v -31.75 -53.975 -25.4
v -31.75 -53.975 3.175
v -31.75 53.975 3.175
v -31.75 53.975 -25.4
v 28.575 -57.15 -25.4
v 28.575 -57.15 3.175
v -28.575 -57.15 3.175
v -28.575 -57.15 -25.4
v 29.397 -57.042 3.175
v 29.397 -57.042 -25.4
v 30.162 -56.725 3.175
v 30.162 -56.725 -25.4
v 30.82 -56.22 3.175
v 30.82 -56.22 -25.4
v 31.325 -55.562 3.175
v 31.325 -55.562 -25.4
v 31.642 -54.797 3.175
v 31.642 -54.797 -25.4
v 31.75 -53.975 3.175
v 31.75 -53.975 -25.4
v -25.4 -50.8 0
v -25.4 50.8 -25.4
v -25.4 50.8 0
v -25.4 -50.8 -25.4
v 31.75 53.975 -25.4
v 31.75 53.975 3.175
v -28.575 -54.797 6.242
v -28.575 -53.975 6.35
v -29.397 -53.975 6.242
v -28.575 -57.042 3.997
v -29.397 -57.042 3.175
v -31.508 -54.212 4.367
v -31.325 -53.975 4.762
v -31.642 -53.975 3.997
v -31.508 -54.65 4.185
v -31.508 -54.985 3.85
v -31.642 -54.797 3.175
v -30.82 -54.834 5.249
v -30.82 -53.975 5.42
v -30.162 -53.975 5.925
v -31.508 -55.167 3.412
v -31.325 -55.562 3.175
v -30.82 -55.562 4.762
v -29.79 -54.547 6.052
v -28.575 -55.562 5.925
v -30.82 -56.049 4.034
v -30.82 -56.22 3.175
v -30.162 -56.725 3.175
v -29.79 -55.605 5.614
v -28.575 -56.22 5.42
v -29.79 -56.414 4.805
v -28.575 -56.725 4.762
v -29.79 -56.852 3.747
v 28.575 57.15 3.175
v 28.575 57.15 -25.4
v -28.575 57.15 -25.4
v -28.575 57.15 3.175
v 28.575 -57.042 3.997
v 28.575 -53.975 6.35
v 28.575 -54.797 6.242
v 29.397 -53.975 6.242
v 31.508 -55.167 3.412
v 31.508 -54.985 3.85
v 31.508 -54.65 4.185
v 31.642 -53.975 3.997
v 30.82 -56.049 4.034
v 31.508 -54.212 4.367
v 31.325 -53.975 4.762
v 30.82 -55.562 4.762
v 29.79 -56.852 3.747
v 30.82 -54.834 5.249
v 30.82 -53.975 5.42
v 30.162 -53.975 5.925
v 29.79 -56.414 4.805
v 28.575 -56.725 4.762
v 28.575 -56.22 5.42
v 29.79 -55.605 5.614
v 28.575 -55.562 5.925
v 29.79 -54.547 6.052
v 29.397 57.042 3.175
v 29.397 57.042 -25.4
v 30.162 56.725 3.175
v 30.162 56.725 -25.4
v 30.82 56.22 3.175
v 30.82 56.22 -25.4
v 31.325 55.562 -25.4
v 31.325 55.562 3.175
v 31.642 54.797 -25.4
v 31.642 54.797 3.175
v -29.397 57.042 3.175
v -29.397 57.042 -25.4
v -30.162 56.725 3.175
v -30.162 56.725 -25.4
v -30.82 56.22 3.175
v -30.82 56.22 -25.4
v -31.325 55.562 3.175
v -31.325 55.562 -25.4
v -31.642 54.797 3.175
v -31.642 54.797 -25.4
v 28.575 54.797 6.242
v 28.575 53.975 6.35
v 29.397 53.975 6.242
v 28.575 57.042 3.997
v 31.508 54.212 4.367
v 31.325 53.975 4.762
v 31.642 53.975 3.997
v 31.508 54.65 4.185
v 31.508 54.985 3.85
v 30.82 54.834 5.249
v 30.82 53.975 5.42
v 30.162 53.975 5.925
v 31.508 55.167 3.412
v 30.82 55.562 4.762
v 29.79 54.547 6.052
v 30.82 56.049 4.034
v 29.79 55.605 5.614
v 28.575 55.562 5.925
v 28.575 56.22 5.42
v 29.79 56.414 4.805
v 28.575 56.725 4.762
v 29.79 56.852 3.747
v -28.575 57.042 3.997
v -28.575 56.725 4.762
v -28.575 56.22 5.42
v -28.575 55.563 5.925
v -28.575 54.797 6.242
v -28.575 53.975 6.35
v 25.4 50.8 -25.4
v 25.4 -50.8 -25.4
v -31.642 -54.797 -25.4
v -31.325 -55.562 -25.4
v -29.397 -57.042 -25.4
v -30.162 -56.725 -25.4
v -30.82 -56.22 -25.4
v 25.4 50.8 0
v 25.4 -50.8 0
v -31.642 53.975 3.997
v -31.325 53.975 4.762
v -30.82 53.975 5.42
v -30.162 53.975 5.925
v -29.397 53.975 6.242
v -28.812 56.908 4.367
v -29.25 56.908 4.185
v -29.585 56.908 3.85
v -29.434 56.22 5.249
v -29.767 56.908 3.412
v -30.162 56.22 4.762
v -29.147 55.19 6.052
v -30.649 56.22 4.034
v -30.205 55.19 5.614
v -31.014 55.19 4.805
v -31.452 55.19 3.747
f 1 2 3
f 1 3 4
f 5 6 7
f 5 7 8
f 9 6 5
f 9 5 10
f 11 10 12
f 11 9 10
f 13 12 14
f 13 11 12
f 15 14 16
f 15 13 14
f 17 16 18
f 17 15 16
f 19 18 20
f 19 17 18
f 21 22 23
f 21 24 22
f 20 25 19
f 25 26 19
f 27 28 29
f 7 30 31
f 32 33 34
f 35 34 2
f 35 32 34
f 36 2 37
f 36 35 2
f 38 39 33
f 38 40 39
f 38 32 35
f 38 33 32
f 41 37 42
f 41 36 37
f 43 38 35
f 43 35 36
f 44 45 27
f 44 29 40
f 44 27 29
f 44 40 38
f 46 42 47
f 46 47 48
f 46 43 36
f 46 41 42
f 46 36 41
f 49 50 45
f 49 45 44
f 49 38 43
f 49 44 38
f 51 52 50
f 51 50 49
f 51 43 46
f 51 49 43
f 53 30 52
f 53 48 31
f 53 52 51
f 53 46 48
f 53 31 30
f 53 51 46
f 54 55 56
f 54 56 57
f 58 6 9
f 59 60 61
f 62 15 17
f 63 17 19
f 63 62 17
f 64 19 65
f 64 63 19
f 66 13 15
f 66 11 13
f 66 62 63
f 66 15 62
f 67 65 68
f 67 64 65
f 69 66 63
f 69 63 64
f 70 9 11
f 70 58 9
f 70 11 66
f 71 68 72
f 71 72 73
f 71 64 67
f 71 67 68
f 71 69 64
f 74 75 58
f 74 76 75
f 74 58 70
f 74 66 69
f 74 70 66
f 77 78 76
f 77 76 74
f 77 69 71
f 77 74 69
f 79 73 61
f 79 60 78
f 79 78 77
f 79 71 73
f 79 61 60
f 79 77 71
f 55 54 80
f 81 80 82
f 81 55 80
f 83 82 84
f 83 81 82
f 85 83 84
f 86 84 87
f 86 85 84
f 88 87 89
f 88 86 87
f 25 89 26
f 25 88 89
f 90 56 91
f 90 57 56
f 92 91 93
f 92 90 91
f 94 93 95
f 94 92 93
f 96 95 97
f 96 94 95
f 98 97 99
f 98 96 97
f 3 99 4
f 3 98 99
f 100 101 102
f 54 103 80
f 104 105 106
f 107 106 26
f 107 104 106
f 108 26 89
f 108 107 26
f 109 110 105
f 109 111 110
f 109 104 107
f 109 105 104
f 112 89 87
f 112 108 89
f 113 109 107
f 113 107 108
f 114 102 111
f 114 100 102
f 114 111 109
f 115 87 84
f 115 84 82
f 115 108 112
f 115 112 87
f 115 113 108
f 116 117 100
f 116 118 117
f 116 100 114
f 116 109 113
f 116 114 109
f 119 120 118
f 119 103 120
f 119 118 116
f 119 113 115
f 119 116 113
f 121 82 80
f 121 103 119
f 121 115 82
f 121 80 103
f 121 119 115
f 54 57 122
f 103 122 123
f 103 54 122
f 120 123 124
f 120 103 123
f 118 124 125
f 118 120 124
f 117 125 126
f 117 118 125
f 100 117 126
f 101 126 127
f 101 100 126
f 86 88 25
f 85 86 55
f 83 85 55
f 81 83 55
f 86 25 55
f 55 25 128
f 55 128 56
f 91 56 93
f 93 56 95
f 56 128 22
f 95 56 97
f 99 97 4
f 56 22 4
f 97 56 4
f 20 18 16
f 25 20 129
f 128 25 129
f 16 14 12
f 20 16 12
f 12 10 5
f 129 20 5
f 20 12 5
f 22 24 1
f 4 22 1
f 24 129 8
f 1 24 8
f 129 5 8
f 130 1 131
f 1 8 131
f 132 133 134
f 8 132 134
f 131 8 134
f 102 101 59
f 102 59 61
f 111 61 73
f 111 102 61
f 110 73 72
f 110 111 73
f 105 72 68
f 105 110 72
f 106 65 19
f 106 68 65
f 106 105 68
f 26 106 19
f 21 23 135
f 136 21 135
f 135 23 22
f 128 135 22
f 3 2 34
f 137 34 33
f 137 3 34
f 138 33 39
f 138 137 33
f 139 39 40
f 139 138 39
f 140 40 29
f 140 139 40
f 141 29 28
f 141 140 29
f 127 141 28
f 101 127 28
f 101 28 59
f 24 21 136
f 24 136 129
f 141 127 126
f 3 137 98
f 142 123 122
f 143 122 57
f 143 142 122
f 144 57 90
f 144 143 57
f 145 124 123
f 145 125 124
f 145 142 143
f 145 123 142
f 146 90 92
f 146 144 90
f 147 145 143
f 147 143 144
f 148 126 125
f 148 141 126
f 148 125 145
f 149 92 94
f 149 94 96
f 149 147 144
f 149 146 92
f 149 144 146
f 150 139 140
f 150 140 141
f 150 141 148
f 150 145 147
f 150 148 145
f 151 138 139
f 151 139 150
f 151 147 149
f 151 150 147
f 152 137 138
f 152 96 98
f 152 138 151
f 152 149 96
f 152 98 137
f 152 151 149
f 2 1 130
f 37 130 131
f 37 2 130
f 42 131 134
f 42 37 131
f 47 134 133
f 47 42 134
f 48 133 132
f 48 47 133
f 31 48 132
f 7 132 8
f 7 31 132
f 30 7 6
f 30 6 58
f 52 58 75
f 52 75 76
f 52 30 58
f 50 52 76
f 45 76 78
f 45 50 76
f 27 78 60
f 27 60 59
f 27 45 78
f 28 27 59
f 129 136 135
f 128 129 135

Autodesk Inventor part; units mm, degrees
ref_plane "YZ Plane" through (0, 0, 0) normal (1, 0, 0) x (0, 1, 0)
ref_plane "XZ Plane" through (0, 0, 0) normal (0, 1, 0) x (-1, 0, 0)
ref_plane "XY Plane" through (0, 0, 0) normal (0, 0, 1) x (1, 0, 0)
sketch "Sketch1" plane through (0, 0, 0) normal (0, 0, 1) x (1, 0, 0)
  line L0 (-25.4, -50.8) -> (25.4, -50.8)
  line L1 (25.4, -50.8) -> (25.4, 50.8)
  line L2 (25.4, 50.8) -> (-25.4, 50.8)
  line L3 (-25.4, 50.8) -> (-25.4, -50.8)
  line L4 (-25.4, -50.8) -> (25.4, 50.8) construction
  line L5 (25.4, -50.8) -> (-25.4, 50.8) construction
  point P0 (0, 0)
  dimension "d0" = 50.8
  dimension "d1" = 101.6
extrude "Extrusion1" add sketch "Sketch1" along normal blind 6.35
sketch "Sketch2" plane through (25.4, -50.8, 0) normal (1, 0, 0) x (0, 0, -1)
  line L0 (-6.35, 0) -> (-6.35, 101.6) projected
  line L1 (-6.35, 101.6) -> (0, 101.6)
  line L2 (0, 101.6) -> (0, 0)
  line L3 (0, 0) -> (-6.35, 0)
  line L4 (-6.35, 0) -> (-6.35, 101.6)
  point P0 (0, 50.8)
extrude "Extrusion2" add sketch "Sketch2" along normal blind 6.35
sketch "Sketch3" plane through (-25.4, -50.8, 0) normal (-1, 0, 0) x (0, 0, 1)
  point P0 (0, 50.8)
sketch "Sketch4" plane through (-25.4, -50.8, 0) normal (-1, 0, 0) x (0, 0, 1)
  line L0 (6.35, 101.6) -> (6.35, 0) projected
  line L1 (0, 0) -> (6.35, 0) projected
  line L2 (6.35, 101.6) -> (0, 101.6)
  line L3 (0, 101.6) -> (0, 0)
  line L4 (0, 0) -> (6.35, 0)
  line L5 (6.35, 0) -> (6.35, 101.6)
  point P0 (0, 50.8)
extrude "Extrusion3" add sketch "Sketch4" along normal blind 6.35
sketch "Sketch5" plane through (31.75, -50.8, 0) normal (0, -1, 0) x (1, 0, 0)
  line L0 (-63.5, 0) -> (-63.5, 6.35) projected
  line L1 (0, 6.35) -> (0, 0) projected
  line L2 (-63.5, 0) -> (0, 0)
  line L3 (0, 0) -> (0, 6.35)
  line L4 (0, 6.35) -> (-63.5, 6.35)
  line L5 (-63.5, 6.35) -> (-63.5, 0)
  point P0 (-31.75, 0)
extrude "Extrusion4" add sketch "Sketch5" along normal blind 6.35
sketch "Sketch6" plane through (31.75, 50.8, 6.35) normal (0, 1, 0) x (1, 0, 0)
  line L0 (-63.5, 0) -> (0, 0) projected
  line L1 (-63.5, 6.35) -> (0, 6.35) projected
  line L2 (-63.5, 0) -> (0, 0)
  line L3 (0, 0) -> (0, 6.35)
  line L4 (0, 6.35) -> (-63.5, 6.35)
  line L5 (-63.5, 6.35) -> (-63.5, 0)
  point P0 (-31.75, 6.35)
extrude "Extrusion5" add sketch "Sketch6" along normal blind 6.35
sketch "Sketch7" plane through (0, 0, 0) normal (0, 0, -1) x (-1, 0, 0)
  line L0 (31.75, -57.15) -> (31.75, 57.15) projected
  line L1 (31.75, -57.15) -> (25.4, -57.15)
  line L2 (25.4, -57.15) -> (25.4, 57.15)
  line L3 (25.4, 57.15) -> (31.75, 57.15)
  line L4 (31.75, 57.15) -> (31.75, -57.15)
  line L5 (-31.75, -57.15) -> (-25.4, -57.15)
  line L6 (-25.4, -57.15) -> (-25.4, 57.15)
  line L7 (-25.4, 57.15) -> (-31.75, 57.15)
  line L8 (-31.75, 57.15) -> (-31.75, -57.15)
  line L9 (25.4, -57.15) -> (-25.4, -57.15)
  line L10 (-25.4, -57.15) -> (-25.4, -50.8)
  line L11 (-25.4, -50.8) -> (25.4, -50.8)
  line L12 (25.4, -50.8) -> (25.4, -57.15)
  line L13 (25.4, 57.15) -> (-25.4, 57.15)
  line L14 (-25.4, 57.15) -> (-25.4, 50.8)
  line L15 (-25.4, 50.8) -> (25.4, 50.8)
  line L16 (25.4, 50.8) -> (25.4, 57.15)
  point P0 (0, 0)
  dimension "d12" = 6.35
  dimension "d13" = 114.3
  dimension "d14" = 6.35
  dimension "d15" = 114.3
  dimension "d16" = 50.8
  dimension "d17" = 6.35
  dimension "d18" = 6.35
  dimension "d19" = 50.8
extrude "Extrusion6" add sketch "Sketch7" along normal blind 25.4 contours L5 L8 L7 L6
sketch "Sketch8" plane through (25.4, -57.15, 0) normal (-1, 0, 0) x (0, 0, 1)
  line L0 (6.35, 0) -> (-25.4, 0) projected
  line L1 (-25.4, 0) -> (0, 0)
  line L2 (0, 0) -> (0, 6.35)
  line L3 (0, 6.35) -> (-25.4, 6.35)
  line L4 (-25.4, 6.35) -> (-25.4, 0)
  point P0 (0, 57.15)
  dimension "d22" = 25.4
  dimension "d23" = 6.35
extrude "Extrusion7" add sketch "Sketch8" along normal blind 57.15
sketch "Sketch9" plane through (25.4, 57.15, -25.4) normal (-1, 0, 0) x (0, 0, 1)
  line L0 (0, 0) -> (0, -114.3) projected
  line L1 (0, 0) -> (25.4, 0)
  line L2 (25.4, 0) -> (25.4, -6.35)
  line L3 (25.4, -6.35) -> (0, -6.35)
  line L4 (0, -6.35) -> (0, 0)
  point P0 (25.4, -57.15)
  dimension "d26" = 25.4
  dimension "d27" = 6.35
extrude "Extrusion8" add sketch "Sketch9" along normal blind 57.15
sketch "Sketch10" plane through (25.4, -50.8, 0) normal (0, 1, 0) x (1, 0, 0)
  line L0 (0, 25.4) -> (-57.15, 25.4) projected
  line L1 (-57.15, 25.4) -> (-50.8, 25.4)
  line L2 (-50.8, 25.4) -> (-50.8, 0)
  line L3 (-50.8, 0) -> (-57.15, 0)
  line L4 (-57.15, 0) -> (-57.15, 25.4)
  point P0 (-25.4, 0)
  dimension "d30" = 6.35
  dimension "d31" = 25.4
extrude "Extrusion9" add sketch "Sketch10" along normal blind 101.6
fillet "Fillet1" radius 3.175 1 edges at (0, -57.15, 6.35)
fillet "Fillet2" radius 3.175 3 edges at (-31.75, 1.5875, 6.35) (-31.75, -56.2201, 5.4201) (-31.75, -57.15, -11.1125)
fillet "Fillet3" radius 3.175 3 edges at (1.5875, 57.15, 6.35) (-30.8201, 57.15, 5.4201) (-31.75, 57.15, -11.1125)
fillet "Fillet4" radius 3.175 5 edges at (31.75, 0, 6.35) (31.75, 56.2201, 5.4201) (31.75, 57.15, -11.1125) (31.75, -56.2201, 5.4201) (31.75, -57.15, -11.1125)
properties part number "Table foot"
